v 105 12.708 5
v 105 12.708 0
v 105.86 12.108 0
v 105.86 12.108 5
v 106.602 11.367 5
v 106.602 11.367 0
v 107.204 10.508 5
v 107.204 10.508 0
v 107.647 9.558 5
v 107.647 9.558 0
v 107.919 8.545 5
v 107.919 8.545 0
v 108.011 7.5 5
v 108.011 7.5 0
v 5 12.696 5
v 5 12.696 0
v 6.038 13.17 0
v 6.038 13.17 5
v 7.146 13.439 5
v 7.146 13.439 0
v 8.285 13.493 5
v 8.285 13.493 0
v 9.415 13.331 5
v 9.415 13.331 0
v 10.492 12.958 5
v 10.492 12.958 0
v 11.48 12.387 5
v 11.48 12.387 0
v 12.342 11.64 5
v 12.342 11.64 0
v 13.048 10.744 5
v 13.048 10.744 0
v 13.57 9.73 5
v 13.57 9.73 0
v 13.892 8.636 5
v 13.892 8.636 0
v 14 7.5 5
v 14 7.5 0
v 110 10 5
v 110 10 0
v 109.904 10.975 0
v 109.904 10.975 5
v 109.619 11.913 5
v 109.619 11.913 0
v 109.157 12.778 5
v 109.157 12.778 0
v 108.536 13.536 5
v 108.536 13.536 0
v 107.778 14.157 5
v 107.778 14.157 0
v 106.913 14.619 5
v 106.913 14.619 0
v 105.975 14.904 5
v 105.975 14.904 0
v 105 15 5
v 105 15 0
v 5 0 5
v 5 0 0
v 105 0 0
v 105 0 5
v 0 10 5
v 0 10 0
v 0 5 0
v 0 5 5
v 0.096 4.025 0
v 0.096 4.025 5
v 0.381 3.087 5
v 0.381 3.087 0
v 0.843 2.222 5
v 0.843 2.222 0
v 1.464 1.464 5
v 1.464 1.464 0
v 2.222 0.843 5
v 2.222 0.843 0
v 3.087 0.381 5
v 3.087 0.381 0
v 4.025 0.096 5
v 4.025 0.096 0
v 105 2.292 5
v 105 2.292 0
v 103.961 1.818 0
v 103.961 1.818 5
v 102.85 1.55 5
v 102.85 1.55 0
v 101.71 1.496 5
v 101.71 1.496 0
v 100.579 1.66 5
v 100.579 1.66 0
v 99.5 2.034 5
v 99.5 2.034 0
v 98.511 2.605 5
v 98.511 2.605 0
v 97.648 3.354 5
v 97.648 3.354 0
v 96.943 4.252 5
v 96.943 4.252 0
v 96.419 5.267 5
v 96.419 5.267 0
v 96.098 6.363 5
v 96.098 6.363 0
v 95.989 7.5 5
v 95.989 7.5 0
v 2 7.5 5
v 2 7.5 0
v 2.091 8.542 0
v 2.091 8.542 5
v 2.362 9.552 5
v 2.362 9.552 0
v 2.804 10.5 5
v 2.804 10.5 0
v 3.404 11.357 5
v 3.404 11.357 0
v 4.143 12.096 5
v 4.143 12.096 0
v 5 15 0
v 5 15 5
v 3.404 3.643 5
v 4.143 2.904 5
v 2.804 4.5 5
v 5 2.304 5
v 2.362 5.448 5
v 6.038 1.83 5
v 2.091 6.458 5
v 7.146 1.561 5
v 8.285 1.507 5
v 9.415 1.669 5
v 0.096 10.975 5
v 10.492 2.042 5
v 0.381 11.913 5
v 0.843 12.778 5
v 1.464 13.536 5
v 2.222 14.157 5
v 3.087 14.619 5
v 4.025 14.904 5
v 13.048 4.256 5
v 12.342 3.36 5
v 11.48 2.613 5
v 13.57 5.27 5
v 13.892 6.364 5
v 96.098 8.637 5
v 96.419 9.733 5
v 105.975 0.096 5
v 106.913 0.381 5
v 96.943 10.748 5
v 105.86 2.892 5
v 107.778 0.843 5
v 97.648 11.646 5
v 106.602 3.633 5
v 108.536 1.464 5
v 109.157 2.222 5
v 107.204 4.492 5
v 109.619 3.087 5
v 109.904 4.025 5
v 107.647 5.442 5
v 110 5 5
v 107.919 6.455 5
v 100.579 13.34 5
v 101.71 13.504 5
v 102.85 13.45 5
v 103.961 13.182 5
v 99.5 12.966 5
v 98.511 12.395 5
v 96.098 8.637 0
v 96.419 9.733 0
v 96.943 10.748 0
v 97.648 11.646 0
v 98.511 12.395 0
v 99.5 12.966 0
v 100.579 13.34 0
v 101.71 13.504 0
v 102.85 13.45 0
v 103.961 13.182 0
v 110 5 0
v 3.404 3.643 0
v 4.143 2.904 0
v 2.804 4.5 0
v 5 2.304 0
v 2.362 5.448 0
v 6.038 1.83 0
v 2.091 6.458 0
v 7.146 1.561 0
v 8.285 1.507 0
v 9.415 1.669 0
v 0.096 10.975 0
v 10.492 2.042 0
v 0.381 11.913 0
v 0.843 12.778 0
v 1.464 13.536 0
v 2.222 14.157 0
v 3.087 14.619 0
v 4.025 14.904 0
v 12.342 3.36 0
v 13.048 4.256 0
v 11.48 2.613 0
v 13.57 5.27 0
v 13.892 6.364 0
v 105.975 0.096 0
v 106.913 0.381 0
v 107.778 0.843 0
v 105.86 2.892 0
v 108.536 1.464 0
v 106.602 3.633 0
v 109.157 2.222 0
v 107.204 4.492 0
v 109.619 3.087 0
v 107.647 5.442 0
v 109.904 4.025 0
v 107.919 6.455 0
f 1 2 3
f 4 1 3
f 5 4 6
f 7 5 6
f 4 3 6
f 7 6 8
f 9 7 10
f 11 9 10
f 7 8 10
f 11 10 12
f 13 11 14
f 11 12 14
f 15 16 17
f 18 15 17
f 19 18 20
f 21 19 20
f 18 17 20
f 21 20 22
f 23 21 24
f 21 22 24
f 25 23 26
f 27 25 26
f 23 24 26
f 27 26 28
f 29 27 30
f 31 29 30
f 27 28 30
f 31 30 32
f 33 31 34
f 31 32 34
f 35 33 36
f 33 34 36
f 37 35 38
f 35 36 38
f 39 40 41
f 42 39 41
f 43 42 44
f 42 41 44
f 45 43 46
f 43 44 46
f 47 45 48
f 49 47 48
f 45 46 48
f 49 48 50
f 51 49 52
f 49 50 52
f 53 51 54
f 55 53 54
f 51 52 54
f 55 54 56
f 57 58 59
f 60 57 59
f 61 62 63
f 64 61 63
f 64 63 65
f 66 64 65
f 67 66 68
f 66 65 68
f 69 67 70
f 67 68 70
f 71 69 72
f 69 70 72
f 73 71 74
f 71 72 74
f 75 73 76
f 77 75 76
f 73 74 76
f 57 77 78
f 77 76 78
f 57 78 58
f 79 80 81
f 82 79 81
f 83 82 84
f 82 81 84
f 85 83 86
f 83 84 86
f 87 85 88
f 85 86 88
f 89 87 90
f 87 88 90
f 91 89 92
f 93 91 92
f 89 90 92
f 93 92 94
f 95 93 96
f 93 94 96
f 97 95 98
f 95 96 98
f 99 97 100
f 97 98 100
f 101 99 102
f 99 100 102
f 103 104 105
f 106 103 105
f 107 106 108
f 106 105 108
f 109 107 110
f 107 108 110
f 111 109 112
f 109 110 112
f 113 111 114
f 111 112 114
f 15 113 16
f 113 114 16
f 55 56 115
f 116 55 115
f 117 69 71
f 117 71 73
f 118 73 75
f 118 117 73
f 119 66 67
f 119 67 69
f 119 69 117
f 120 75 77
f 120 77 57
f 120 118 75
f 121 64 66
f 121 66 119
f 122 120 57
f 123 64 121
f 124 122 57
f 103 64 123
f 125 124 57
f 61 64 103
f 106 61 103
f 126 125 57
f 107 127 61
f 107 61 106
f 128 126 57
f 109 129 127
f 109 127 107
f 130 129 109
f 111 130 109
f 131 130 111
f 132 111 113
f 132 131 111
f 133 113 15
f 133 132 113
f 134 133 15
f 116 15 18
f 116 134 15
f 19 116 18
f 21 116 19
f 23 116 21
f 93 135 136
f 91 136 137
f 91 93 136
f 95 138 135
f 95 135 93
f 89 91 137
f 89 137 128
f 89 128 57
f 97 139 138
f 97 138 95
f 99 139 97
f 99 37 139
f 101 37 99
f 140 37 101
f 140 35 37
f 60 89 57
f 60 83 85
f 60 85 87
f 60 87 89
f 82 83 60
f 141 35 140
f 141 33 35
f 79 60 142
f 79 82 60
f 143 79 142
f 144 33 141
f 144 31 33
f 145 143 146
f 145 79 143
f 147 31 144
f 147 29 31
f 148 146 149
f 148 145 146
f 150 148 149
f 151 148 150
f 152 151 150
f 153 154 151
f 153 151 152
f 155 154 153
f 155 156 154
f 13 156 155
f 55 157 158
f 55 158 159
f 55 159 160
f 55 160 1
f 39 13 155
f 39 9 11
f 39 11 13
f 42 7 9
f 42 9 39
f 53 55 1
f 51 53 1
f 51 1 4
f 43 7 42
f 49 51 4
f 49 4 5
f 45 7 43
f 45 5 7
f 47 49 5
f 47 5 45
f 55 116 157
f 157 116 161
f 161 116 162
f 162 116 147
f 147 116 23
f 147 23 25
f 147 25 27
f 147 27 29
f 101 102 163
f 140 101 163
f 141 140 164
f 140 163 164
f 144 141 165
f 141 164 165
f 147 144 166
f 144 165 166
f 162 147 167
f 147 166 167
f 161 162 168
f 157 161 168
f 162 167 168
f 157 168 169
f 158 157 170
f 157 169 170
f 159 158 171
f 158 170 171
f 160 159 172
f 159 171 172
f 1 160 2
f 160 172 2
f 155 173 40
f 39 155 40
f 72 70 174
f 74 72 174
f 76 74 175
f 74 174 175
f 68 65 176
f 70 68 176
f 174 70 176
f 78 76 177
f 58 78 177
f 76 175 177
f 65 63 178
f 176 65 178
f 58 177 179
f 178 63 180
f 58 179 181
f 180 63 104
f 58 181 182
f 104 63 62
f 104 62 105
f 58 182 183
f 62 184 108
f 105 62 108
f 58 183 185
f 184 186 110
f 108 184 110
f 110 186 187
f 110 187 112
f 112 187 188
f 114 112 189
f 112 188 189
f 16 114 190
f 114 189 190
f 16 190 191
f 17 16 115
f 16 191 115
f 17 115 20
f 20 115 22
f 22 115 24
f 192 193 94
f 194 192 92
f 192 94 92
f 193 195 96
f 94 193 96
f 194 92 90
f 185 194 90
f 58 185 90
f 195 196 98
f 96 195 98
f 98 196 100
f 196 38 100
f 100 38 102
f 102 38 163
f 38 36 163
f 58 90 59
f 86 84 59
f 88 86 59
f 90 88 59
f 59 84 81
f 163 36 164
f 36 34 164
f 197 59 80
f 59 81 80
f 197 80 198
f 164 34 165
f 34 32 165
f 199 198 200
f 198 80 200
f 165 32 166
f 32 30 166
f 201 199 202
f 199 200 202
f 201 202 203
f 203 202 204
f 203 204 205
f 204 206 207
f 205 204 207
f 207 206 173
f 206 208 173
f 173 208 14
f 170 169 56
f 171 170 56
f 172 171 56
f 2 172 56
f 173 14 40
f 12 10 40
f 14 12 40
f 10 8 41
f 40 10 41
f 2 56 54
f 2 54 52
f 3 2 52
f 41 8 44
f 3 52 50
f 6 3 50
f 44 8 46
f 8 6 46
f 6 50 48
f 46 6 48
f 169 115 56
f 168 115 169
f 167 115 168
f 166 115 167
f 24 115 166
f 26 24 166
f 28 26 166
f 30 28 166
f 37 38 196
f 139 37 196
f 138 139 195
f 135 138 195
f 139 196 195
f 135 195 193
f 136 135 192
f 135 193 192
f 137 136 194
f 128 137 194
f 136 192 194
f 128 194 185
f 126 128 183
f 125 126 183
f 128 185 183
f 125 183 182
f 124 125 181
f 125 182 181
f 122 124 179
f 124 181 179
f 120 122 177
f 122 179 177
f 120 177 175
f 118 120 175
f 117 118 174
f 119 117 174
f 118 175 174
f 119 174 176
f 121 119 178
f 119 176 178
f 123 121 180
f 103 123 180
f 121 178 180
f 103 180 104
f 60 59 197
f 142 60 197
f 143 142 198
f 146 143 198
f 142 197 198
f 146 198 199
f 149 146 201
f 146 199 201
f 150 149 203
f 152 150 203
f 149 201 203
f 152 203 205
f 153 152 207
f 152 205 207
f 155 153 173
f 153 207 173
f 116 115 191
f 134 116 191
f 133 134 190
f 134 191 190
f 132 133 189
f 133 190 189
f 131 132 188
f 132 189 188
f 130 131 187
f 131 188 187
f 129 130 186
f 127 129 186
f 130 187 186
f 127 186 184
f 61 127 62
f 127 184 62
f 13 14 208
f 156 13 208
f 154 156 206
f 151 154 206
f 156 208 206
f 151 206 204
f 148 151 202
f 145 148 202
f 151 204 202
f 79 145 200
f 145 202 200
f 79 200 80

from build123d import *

# Parameters (mm, degrees)
EXTRUDE_1_DEPTH = 5


with BuildPart() as part:
    # 草图1 → 凸台-拉伸1 (new body)
    with BuildSketch(Plane.XY):
        with BuildLine():
            Line((95.989328864, 7.5), (14, 7.5))
            ThreePointArc((14, 7.5), (11, 2.303847577), (5, 2.303847577))
            Line((5, 2.303847577), (5, 0))
            Line((5, 0), (105, 0))
            Line((105, 0), (105, 2.291529254))
            ThreePointArc((105, 2.291529254), (98.991997831, 2.296146576), (95.989328864, 7.5))
        make_face()
        with BuildLine():
            ThreePointArc((5, 2.303847577), (2.803847577, 4.5), (2, 7.5))
            Line((2, 7.5), (0, 7.5))
            Line((0, 7.5), (0, 5))
            ThreePointArc((0, 5), (1.464466094, 1.464466094), (5, 0))
            Line((5, 0), (5, 2.303847577))
        make_face()
        with BuildLine():
            Line((5, 12.696152423), (5, 15))
            ThreePointArc((5, 15), (1.464466094, 13.535533906), (0, 10))
            Line((0, 10), (0, 7.5))
            Line((0, 7.5), (2, 7.5))
            ThreePointArc((2, 7.5), (2.803847577, 10.5), (5, 12.696152423))
        make_face()
        with BuildLine():
            Line((105, 15), (5, 15))
            Line((5, 15), (5, 12.696152423))
            ThreePointArc((5, 12.696152423), (11, 12.696152423), (14, 7.5))
            Line((14, 7.5), (95.989328864, 7.5))
            ThreePointArc((95.989328864, 7.5), (98.991997831, 12.703853424), (105, 12.708470746))
            Line((105, 12.708470746), (105, 15))
        make_face()
        with BuildLine():
            ThreePointArc((110, 10), (108.535533906, 13.535533906), (105, 15))
            Line((105, 15), (105, 12.708470746))
            ThreePointArc((105, 12.708470746), (107.203853424, 10.508002169), (108.010671136, 7.5))
            Line((108.010671136, 7.5), (110, 7.5))
            Line((110, 7.5), (110, 10))
        make_face()
        with BuildLine():
            Line((110, 7.5), (108.010671136, 7.5))
            ThreePointArc((108.010671136, 7.5), (107.203853424, 4.491997831), (105, 2.291529254))
            Line((105, 2.291529254), (105, 0))
            ThreePointArc((105, 0), (108.535533906, 1.464466094), (110, 5))
            Line((110, 5), (110, 7.5))
        make_face()
    extrude(amount=EXTRUDE_1_DEPTH)


solid = part.part
